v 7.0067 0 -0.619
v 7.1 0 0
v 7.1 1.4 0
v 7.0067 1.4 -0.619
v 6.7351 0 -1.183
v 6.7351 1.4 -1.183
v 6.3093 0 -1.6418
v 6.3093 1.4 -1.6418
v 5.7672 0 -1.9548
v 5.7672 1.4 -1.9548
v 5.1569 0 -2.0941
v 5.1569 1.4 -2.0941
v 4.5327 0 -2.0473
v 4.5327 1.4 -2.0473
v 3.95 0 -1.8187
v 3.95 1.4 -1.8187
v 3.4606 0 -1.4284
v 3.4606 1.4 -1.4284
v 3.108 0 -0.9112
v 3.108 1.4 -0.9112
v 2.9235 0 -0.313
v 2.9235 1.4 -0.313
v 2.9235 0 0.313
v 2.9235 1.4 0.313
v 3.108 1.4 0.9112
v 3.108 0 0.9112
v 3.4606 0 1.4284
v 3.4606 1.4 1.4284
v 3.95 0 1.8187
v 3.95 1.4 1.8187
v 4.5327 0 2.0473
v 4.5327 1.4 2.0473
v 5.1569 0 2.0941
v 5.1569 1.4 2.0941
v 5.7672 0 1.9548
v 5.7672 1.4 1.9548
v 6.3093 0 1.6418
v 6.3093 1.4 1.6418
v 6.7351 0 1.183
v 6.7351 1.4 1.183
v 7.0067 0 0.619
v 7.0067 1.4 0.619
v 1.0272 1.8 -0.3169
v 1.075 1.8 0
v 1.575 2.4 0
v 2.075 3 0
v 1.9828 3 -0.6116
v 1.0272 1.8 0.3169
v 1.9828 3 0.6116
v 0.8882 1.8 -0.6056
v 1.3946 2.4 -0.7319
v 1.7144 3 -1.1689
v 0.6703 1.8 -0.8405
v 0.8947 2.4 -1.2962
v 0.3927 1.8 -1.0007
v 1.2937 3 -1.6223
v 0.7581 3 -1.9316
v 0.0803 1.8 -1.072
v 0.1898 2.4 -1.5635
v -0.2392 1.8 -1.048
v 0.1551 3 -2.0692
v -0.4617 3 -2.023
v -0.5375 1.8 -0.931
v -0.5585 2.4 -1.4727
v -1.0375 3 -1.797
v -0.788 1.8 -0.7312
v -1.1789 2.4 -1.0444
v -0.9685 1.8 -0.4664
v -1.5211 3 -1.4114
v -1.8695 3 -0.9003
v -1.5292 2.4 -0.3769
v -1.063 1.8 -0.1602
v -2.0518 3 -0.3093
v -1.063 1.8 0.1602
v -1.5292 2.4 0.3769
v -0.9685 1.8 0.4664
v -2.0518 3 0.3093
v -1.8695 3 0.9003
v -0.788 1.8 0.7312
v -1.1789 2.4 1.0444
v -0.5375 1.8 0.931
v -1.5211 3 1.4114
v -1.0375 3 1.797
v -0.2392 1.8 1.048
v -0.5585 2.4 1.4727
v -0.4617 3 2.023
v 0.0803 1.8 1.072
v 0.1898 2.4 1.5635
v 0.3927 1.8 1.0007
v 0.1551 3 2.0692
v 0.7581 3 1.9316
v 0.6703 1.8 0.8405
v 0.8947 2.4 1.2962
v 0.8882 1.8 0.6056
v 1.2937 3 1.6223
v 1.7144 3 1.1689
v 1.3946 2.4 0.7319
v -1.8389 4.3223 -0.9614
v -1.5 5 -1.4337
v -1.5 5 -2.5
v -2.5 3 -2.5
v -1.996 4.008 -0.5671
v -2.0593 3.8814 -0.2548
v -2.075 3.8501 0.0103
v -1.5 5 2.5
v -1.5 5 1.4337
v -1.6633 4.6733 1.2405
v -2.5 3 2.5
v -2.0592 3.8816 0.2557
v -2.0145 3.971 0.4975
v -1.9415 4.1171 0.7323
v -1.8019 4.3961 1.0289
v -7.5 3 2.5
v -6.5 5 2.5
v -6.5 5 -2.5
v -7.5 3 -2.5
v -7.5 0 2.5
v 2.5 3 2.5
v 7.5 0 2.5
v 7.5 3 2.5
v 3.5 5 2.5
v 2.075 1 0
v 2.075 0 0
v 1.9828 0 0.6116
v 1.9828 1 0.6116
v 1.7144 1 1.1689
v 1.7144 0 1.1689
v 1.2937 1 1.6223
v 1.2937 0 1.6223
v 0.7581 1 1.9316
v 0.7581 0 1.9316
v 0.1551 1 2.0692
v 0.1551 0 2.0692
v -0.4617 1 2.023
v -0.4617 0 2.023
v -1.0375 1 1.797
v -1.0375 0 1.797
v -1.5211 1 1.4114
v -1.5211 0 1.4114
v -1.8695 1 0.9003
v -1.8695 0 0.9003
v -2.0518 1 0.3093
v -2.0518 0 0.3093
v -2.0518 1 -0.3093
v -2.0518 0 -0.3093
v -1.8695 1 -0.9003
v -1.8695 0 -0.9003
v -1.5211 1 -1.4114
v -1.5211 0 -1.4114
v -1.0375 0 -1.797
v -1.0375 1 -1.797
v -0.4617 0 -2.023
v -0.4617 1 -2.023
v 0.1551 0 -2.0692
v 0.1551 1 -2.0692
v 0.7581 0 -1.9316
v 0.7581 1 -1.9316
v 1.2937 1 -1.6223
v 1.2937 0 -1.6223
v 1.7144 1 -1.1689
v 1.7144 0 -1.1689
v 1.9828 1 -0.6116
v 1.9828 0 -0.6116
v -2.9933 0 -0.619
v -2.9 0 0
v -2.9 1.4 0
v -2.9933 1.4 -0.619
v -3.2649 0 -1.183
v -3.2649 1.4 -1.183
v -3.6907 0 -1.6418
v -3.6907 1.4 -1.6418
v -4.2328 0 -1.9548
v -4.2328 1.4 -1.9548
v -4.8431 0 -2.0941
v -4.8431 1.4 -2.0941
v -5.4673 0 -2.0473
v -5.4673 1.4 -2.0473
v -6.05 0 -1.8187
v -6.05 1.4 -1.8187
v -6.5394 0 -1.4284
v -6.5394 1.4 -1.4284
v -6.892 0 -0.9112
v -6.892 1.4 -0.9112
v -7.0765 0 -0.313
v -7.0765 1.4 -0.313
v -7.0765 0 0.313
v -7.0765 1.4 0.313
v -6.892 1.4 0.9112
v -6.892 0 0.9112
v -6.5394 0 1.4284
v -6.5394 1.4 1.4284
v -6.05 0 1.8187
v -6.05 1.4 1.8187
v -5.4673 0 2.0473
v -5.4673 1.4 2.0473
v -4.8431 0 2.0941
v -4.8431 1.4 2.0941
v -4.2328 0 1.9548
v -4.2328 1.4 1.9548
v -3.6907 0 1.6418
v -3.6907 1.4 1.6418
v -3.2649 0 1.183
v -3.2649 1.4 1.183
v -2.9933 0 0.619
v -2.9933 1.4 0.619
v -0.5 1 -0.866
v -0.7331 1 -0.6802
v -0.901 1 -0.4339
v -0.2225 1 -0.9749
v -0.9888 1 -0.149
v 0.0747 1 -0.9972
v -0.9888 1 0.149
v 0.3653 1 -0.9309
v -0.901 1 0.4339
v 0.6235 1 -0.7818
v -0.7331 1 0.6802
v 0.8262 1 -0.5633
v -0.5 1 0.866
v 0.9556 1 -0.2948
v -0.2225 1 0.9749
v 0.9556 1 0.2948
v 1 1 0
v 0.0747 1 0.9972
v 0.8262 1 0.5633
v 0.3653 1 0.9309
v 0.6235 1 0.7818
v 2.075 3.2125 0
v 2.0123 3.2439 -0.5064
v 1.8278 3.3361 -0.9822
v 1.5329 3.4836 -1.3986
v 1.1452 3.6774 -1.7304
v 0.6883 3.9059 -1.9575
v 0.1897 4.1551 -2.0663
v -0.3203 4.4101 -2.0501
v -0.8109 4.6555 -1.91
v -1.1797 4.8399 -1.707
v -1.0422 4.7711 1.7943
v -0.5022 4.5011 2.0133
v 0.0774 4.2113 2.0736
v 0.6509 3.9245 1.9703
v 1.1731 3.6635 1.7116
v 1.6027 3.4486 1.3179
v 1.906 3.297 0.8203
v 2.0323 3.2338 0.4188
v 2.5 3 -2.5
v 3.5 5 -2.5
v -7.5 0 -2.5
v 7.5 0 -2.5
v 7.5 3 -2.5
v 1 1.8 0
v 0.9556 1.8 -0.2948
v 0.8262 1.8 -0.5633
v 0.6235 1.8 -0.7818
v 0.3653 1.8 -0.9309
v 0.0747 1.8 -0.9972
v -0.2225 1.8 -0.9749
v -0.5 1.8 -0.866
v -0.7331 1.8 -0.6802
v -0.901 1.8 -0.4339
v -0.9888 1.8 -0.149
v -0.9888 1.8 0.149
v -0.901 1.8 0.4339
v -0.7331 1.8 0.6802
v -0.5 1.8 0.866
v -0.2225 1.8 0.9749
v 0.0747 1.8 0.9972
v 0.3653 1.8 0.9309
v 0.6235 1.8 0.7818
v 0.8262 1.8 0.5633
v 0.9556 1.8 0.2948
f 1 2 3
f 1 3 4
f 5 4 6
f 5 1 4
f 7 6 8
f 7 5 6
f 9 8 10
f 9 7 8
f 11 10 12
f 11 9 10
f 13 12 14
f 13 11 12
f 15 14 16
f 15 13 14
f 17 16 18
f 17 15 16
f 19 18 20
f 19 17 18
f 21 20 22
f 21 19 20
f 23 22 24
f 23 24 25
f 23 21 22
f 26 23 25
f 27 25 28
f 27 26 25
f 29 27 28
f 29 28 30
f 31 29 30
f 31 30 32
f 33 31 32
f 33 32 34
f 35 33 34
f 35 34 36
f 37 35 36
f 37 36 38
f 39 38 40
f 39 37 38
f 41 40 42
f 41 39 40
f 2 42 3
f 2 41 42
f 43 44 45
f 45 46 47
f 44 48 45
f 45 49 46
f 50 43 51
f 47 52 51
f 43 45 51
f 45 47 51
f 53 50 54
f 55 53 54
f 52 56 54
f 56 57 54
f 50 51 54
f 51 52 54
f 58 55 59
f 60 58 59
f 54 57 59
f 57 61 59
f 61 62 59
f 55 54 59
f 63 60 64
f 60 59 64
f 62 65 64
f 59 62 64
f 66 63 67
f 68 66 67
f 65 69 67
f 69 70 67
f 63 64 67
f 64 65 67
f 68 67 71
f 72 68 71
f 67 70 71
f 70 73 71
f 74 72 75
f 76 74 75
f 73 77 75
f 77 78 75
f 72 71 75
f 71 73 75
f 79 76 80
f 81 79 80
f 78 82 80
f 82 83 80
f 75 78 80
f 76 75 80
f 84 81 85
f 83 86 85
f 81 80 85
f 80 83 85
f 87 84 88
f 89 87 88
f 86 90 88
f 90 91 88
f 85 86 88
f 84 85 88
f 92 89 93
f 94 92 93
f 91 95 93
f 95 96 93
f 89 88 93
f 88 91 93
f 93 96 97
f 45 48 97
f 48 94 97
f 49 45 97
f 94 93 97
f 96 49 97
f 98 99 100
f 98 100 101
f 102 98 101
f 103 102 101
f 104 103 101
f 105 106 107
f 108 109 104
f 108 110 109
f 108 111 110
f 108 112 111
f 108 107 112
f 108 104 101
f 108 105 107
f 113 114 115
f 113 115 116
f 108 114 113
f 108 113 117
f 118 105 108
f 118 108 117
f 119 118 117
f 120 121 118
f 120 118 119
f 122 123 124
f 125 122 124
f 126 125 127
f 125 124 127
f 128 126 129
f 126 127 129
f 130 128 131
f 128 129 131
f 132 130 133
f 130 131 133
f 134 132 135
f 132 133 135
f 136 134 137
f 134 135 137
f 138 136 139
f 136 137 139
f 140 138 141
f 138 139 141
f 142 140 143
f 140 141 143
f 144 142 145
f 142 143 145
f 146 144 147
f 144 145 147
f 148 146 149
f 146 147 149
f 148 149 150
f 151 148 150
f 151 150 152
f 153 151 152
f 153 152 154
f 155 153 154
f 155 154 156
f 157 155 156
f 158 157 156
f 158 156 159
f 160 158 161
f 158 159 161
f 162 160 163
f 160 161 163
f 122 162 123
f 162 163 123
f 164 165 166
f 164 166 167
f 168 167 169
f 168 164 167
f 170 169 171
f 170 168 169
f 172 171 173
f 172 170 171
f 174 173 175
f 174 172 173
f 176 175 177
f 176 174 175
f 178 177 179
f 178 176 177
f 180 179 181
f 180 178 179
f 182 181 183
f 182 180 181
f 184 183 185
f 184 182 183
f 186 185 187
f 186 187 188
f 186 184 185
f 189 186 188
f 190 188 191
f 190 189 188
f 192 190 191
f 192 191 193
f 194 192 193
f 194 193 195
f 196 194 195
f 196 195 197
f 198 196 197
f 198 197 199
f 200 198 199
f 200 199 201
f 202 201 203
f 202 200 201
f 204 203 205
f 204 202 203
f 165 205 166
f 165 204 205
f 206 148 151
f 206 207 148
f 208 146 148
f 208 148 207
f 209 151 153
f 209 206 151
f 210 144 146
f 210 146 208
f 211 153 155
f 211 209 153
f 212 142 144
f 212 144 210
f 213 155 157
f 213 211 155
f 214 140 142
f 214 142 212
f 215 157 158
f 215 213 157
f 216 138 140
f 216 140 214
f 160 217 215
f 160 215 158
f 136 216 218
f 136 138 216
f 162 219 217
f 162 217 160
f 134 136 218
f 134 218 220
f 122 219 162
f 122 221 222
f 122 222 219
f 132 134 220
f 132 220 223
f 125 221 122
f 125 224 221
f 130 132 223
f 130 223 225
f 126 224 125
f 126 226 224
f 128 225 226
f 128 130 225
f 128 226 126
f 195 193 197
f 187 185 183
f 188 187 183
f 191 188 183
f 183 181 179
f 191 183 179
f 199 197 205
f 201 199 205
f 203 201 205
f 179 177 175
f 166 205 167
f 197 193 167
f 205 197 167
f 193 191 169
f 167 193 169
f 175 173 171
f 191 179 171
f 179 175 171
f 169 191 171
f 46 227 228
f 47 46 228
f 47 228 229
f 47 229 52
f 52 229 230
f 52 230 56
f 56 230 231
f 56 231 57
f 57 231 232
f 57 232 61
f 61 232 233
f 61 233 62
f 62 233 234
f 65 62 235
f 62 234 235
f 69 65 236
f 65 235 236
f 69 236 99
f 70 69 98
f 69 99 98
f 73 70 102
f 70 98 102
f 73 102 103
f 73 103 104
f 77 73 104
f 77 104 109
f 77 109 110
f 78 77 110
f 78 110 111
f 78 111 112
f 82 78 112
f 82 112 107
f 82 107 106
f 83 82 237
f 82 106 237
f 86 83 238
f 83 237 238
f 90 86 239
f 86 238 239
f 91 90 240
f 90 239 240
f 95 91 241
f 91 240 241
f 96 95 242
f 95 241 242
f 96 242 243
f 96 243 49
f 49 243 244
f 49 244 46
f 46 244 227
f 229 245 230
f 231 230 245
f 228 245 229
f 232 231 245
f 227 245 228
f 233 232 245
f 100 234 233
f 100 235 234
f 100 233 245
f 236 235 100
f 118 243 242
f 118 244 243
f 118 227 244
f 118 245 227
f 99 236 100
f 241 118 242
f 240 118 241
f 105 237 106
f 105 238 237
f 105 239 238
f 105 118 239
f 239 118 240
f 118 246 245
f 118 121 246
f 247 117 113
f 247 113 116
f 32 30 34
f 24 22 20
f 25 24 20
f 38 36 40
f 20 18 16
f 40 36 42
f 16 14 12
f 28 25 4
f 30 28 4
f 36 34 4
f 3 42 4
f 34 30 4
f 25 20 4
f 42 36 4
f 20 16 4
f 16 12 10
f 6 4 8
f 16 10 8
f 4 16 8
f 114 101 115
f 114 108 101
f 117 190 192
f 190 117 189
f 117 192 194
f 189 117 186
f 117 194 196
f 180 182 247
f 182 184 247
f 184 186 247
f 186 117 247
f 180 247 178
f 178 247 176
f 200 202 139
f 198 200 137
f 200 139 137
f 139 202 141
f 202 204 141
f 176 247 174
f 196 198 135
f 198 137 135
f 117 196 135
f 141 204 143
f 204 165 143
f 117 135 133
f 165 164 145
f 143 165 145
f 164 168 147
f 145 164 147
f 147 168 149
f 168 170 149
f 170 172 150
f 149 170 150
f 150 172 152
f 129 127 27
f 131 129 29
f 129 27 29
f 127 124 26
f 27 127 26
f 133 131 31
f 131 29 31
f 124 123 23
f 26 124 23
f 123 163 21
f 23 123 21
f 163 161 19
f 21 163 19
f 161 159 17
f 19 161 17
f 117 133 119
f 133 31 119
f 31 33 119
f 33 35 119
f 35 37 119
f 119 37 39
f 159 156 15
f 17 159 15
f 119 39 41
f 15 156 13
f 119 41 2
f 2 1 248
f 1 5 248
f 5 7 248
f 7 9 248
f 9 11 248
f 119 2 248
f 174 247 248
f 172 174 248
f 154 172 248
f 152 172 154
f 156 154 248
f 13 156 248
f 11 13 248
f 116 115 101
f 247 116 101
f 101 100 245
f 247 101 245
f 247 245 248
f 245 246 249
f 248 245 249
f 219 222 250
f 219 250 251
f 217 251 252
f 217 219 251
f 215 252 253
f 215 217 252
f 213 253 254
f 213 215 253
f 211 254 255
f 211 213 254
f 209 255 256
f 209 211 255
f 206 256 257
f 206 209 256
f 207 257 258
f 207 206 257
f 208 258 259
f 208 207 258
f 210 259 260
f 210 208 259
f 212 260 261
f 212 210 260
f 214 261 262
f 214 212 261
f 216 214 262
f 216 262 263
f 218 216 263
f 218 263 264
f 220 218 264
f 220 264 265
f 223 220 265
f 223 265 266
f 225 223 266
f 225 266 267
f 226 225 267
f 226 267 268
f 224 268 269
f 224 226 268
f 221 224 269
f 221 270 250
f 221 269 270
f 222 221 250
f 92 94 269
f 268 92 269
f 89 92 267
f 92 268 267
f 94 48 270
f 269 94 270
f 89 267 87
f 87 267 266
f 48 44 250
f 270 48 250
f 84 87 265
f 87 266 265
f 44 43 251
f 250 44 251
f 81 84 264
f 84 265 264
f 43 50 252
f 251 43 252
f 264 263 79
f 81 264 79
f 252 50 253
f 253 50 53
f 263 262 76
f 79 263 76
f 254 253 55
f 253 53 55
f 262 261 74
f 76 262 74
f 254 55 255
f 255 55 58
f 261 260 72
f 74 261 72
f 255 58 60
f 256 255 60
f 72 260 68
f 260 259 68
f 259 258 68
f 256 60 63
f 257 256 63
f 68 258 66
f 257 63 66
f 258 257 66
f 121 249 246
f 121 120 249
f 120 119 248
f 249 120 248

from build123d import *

# Parameters (mm, degrees)
SKETCH_1_W          = 15
SKETCH_1_H          = 5
EXTRUDE_1_DEPTH     = 3
EXTRUDE_2_DEPTH     = 2.5
SKETCH_1_3_R        = 1
CUT_EXTRUDE_1_DEPTH = 10.354143467
SKETCH_1_4_R        = 2.1
CUT_EXTRUDE_2_DEPTH = 1.4
CUT_EXTRUDE_START   = -1
SKETCH_5_R          = 2.075
CUT_EXTRUDE_3_DEPTH = 1


with BuildPart() as part:
    # 草图1 → 凸台-拉伸1 (new body)
    with BuildSketch(Plane(origin=(0, 0, 0), x_dir=(1, 0, 0), z_dir=(0, 1, 0))):
        Rectangle(SKETCH_1_W, SKETCH_1_H)
    extrude(amount=EXTRUDE_1_DEPTH)

    # 草图2 → 凸台-拉伸2 (add, symmetric)
    with BuildSketch(Plane.XY):
        Polygon((2.5, 3), (7.5, 3), (3.5, 5), align=None)
        Polygon((-7.5, 3), (-2.5, 3), (-6.5, 5), align=None)
        Polygon((-2.5, 3), (2.5, 3), (-1.5, 5), align=None)
    extrude(amount=EXTRUDE_2_DEPTH, both=True)

    # 草图1<3> → 切除-拉伸1 (cut, through all)
    with BuildSketch(Plane(origin=(0, 0, 0), x_dir=(1, 0, 0), z_dir=(0, 1, 0))):
        Circle(SKETCH_1_3_R)
    extrude(amount=CUT_EXTRUDE_1_DEPTH, mode=Mode.SUBTRACT)

    # 草图1<4> → 切除-拉伸2 (cut)
    with BuildSketch(Plane(origin=(0, 0, 0), x_dir=(1, 0, 0), z_dir=(0, 1, 0))):
        with Locations((5, 0)):
            Circle(SKETCH_1_4_R)
        with Locations((-5, 0)):
            Circle(SKETCH_1_4_R)
    extrude(amount=CUT_EXTRUDE_2_DEPTH, mode=Mode.SUBTRACT)

    # 草图4 → 切除-旋转1 (revolve, cut)
    with BuildSketch(Plane.XY):
        Polygon((0, 1.8), (1.075, 1.8), (2.075, 3), (2.075, 5), (0, 5), align=None)
    revolve(axis=Axis((0, 0, 0), (0, 1, 0)), mode=Mode.SUBTRACT)

    # 草图5 → 切除-拉伸3 (cut)
    with BuildSketch(Plane.XZ.offset(CUT_EXTRUDE_START)):
        Circle(SKETCH_5_R)
    extrude(amount=CUT_EXTRUDE_3_DEPTH, mode=Mode.SUBTRACT)


solid = part.part
